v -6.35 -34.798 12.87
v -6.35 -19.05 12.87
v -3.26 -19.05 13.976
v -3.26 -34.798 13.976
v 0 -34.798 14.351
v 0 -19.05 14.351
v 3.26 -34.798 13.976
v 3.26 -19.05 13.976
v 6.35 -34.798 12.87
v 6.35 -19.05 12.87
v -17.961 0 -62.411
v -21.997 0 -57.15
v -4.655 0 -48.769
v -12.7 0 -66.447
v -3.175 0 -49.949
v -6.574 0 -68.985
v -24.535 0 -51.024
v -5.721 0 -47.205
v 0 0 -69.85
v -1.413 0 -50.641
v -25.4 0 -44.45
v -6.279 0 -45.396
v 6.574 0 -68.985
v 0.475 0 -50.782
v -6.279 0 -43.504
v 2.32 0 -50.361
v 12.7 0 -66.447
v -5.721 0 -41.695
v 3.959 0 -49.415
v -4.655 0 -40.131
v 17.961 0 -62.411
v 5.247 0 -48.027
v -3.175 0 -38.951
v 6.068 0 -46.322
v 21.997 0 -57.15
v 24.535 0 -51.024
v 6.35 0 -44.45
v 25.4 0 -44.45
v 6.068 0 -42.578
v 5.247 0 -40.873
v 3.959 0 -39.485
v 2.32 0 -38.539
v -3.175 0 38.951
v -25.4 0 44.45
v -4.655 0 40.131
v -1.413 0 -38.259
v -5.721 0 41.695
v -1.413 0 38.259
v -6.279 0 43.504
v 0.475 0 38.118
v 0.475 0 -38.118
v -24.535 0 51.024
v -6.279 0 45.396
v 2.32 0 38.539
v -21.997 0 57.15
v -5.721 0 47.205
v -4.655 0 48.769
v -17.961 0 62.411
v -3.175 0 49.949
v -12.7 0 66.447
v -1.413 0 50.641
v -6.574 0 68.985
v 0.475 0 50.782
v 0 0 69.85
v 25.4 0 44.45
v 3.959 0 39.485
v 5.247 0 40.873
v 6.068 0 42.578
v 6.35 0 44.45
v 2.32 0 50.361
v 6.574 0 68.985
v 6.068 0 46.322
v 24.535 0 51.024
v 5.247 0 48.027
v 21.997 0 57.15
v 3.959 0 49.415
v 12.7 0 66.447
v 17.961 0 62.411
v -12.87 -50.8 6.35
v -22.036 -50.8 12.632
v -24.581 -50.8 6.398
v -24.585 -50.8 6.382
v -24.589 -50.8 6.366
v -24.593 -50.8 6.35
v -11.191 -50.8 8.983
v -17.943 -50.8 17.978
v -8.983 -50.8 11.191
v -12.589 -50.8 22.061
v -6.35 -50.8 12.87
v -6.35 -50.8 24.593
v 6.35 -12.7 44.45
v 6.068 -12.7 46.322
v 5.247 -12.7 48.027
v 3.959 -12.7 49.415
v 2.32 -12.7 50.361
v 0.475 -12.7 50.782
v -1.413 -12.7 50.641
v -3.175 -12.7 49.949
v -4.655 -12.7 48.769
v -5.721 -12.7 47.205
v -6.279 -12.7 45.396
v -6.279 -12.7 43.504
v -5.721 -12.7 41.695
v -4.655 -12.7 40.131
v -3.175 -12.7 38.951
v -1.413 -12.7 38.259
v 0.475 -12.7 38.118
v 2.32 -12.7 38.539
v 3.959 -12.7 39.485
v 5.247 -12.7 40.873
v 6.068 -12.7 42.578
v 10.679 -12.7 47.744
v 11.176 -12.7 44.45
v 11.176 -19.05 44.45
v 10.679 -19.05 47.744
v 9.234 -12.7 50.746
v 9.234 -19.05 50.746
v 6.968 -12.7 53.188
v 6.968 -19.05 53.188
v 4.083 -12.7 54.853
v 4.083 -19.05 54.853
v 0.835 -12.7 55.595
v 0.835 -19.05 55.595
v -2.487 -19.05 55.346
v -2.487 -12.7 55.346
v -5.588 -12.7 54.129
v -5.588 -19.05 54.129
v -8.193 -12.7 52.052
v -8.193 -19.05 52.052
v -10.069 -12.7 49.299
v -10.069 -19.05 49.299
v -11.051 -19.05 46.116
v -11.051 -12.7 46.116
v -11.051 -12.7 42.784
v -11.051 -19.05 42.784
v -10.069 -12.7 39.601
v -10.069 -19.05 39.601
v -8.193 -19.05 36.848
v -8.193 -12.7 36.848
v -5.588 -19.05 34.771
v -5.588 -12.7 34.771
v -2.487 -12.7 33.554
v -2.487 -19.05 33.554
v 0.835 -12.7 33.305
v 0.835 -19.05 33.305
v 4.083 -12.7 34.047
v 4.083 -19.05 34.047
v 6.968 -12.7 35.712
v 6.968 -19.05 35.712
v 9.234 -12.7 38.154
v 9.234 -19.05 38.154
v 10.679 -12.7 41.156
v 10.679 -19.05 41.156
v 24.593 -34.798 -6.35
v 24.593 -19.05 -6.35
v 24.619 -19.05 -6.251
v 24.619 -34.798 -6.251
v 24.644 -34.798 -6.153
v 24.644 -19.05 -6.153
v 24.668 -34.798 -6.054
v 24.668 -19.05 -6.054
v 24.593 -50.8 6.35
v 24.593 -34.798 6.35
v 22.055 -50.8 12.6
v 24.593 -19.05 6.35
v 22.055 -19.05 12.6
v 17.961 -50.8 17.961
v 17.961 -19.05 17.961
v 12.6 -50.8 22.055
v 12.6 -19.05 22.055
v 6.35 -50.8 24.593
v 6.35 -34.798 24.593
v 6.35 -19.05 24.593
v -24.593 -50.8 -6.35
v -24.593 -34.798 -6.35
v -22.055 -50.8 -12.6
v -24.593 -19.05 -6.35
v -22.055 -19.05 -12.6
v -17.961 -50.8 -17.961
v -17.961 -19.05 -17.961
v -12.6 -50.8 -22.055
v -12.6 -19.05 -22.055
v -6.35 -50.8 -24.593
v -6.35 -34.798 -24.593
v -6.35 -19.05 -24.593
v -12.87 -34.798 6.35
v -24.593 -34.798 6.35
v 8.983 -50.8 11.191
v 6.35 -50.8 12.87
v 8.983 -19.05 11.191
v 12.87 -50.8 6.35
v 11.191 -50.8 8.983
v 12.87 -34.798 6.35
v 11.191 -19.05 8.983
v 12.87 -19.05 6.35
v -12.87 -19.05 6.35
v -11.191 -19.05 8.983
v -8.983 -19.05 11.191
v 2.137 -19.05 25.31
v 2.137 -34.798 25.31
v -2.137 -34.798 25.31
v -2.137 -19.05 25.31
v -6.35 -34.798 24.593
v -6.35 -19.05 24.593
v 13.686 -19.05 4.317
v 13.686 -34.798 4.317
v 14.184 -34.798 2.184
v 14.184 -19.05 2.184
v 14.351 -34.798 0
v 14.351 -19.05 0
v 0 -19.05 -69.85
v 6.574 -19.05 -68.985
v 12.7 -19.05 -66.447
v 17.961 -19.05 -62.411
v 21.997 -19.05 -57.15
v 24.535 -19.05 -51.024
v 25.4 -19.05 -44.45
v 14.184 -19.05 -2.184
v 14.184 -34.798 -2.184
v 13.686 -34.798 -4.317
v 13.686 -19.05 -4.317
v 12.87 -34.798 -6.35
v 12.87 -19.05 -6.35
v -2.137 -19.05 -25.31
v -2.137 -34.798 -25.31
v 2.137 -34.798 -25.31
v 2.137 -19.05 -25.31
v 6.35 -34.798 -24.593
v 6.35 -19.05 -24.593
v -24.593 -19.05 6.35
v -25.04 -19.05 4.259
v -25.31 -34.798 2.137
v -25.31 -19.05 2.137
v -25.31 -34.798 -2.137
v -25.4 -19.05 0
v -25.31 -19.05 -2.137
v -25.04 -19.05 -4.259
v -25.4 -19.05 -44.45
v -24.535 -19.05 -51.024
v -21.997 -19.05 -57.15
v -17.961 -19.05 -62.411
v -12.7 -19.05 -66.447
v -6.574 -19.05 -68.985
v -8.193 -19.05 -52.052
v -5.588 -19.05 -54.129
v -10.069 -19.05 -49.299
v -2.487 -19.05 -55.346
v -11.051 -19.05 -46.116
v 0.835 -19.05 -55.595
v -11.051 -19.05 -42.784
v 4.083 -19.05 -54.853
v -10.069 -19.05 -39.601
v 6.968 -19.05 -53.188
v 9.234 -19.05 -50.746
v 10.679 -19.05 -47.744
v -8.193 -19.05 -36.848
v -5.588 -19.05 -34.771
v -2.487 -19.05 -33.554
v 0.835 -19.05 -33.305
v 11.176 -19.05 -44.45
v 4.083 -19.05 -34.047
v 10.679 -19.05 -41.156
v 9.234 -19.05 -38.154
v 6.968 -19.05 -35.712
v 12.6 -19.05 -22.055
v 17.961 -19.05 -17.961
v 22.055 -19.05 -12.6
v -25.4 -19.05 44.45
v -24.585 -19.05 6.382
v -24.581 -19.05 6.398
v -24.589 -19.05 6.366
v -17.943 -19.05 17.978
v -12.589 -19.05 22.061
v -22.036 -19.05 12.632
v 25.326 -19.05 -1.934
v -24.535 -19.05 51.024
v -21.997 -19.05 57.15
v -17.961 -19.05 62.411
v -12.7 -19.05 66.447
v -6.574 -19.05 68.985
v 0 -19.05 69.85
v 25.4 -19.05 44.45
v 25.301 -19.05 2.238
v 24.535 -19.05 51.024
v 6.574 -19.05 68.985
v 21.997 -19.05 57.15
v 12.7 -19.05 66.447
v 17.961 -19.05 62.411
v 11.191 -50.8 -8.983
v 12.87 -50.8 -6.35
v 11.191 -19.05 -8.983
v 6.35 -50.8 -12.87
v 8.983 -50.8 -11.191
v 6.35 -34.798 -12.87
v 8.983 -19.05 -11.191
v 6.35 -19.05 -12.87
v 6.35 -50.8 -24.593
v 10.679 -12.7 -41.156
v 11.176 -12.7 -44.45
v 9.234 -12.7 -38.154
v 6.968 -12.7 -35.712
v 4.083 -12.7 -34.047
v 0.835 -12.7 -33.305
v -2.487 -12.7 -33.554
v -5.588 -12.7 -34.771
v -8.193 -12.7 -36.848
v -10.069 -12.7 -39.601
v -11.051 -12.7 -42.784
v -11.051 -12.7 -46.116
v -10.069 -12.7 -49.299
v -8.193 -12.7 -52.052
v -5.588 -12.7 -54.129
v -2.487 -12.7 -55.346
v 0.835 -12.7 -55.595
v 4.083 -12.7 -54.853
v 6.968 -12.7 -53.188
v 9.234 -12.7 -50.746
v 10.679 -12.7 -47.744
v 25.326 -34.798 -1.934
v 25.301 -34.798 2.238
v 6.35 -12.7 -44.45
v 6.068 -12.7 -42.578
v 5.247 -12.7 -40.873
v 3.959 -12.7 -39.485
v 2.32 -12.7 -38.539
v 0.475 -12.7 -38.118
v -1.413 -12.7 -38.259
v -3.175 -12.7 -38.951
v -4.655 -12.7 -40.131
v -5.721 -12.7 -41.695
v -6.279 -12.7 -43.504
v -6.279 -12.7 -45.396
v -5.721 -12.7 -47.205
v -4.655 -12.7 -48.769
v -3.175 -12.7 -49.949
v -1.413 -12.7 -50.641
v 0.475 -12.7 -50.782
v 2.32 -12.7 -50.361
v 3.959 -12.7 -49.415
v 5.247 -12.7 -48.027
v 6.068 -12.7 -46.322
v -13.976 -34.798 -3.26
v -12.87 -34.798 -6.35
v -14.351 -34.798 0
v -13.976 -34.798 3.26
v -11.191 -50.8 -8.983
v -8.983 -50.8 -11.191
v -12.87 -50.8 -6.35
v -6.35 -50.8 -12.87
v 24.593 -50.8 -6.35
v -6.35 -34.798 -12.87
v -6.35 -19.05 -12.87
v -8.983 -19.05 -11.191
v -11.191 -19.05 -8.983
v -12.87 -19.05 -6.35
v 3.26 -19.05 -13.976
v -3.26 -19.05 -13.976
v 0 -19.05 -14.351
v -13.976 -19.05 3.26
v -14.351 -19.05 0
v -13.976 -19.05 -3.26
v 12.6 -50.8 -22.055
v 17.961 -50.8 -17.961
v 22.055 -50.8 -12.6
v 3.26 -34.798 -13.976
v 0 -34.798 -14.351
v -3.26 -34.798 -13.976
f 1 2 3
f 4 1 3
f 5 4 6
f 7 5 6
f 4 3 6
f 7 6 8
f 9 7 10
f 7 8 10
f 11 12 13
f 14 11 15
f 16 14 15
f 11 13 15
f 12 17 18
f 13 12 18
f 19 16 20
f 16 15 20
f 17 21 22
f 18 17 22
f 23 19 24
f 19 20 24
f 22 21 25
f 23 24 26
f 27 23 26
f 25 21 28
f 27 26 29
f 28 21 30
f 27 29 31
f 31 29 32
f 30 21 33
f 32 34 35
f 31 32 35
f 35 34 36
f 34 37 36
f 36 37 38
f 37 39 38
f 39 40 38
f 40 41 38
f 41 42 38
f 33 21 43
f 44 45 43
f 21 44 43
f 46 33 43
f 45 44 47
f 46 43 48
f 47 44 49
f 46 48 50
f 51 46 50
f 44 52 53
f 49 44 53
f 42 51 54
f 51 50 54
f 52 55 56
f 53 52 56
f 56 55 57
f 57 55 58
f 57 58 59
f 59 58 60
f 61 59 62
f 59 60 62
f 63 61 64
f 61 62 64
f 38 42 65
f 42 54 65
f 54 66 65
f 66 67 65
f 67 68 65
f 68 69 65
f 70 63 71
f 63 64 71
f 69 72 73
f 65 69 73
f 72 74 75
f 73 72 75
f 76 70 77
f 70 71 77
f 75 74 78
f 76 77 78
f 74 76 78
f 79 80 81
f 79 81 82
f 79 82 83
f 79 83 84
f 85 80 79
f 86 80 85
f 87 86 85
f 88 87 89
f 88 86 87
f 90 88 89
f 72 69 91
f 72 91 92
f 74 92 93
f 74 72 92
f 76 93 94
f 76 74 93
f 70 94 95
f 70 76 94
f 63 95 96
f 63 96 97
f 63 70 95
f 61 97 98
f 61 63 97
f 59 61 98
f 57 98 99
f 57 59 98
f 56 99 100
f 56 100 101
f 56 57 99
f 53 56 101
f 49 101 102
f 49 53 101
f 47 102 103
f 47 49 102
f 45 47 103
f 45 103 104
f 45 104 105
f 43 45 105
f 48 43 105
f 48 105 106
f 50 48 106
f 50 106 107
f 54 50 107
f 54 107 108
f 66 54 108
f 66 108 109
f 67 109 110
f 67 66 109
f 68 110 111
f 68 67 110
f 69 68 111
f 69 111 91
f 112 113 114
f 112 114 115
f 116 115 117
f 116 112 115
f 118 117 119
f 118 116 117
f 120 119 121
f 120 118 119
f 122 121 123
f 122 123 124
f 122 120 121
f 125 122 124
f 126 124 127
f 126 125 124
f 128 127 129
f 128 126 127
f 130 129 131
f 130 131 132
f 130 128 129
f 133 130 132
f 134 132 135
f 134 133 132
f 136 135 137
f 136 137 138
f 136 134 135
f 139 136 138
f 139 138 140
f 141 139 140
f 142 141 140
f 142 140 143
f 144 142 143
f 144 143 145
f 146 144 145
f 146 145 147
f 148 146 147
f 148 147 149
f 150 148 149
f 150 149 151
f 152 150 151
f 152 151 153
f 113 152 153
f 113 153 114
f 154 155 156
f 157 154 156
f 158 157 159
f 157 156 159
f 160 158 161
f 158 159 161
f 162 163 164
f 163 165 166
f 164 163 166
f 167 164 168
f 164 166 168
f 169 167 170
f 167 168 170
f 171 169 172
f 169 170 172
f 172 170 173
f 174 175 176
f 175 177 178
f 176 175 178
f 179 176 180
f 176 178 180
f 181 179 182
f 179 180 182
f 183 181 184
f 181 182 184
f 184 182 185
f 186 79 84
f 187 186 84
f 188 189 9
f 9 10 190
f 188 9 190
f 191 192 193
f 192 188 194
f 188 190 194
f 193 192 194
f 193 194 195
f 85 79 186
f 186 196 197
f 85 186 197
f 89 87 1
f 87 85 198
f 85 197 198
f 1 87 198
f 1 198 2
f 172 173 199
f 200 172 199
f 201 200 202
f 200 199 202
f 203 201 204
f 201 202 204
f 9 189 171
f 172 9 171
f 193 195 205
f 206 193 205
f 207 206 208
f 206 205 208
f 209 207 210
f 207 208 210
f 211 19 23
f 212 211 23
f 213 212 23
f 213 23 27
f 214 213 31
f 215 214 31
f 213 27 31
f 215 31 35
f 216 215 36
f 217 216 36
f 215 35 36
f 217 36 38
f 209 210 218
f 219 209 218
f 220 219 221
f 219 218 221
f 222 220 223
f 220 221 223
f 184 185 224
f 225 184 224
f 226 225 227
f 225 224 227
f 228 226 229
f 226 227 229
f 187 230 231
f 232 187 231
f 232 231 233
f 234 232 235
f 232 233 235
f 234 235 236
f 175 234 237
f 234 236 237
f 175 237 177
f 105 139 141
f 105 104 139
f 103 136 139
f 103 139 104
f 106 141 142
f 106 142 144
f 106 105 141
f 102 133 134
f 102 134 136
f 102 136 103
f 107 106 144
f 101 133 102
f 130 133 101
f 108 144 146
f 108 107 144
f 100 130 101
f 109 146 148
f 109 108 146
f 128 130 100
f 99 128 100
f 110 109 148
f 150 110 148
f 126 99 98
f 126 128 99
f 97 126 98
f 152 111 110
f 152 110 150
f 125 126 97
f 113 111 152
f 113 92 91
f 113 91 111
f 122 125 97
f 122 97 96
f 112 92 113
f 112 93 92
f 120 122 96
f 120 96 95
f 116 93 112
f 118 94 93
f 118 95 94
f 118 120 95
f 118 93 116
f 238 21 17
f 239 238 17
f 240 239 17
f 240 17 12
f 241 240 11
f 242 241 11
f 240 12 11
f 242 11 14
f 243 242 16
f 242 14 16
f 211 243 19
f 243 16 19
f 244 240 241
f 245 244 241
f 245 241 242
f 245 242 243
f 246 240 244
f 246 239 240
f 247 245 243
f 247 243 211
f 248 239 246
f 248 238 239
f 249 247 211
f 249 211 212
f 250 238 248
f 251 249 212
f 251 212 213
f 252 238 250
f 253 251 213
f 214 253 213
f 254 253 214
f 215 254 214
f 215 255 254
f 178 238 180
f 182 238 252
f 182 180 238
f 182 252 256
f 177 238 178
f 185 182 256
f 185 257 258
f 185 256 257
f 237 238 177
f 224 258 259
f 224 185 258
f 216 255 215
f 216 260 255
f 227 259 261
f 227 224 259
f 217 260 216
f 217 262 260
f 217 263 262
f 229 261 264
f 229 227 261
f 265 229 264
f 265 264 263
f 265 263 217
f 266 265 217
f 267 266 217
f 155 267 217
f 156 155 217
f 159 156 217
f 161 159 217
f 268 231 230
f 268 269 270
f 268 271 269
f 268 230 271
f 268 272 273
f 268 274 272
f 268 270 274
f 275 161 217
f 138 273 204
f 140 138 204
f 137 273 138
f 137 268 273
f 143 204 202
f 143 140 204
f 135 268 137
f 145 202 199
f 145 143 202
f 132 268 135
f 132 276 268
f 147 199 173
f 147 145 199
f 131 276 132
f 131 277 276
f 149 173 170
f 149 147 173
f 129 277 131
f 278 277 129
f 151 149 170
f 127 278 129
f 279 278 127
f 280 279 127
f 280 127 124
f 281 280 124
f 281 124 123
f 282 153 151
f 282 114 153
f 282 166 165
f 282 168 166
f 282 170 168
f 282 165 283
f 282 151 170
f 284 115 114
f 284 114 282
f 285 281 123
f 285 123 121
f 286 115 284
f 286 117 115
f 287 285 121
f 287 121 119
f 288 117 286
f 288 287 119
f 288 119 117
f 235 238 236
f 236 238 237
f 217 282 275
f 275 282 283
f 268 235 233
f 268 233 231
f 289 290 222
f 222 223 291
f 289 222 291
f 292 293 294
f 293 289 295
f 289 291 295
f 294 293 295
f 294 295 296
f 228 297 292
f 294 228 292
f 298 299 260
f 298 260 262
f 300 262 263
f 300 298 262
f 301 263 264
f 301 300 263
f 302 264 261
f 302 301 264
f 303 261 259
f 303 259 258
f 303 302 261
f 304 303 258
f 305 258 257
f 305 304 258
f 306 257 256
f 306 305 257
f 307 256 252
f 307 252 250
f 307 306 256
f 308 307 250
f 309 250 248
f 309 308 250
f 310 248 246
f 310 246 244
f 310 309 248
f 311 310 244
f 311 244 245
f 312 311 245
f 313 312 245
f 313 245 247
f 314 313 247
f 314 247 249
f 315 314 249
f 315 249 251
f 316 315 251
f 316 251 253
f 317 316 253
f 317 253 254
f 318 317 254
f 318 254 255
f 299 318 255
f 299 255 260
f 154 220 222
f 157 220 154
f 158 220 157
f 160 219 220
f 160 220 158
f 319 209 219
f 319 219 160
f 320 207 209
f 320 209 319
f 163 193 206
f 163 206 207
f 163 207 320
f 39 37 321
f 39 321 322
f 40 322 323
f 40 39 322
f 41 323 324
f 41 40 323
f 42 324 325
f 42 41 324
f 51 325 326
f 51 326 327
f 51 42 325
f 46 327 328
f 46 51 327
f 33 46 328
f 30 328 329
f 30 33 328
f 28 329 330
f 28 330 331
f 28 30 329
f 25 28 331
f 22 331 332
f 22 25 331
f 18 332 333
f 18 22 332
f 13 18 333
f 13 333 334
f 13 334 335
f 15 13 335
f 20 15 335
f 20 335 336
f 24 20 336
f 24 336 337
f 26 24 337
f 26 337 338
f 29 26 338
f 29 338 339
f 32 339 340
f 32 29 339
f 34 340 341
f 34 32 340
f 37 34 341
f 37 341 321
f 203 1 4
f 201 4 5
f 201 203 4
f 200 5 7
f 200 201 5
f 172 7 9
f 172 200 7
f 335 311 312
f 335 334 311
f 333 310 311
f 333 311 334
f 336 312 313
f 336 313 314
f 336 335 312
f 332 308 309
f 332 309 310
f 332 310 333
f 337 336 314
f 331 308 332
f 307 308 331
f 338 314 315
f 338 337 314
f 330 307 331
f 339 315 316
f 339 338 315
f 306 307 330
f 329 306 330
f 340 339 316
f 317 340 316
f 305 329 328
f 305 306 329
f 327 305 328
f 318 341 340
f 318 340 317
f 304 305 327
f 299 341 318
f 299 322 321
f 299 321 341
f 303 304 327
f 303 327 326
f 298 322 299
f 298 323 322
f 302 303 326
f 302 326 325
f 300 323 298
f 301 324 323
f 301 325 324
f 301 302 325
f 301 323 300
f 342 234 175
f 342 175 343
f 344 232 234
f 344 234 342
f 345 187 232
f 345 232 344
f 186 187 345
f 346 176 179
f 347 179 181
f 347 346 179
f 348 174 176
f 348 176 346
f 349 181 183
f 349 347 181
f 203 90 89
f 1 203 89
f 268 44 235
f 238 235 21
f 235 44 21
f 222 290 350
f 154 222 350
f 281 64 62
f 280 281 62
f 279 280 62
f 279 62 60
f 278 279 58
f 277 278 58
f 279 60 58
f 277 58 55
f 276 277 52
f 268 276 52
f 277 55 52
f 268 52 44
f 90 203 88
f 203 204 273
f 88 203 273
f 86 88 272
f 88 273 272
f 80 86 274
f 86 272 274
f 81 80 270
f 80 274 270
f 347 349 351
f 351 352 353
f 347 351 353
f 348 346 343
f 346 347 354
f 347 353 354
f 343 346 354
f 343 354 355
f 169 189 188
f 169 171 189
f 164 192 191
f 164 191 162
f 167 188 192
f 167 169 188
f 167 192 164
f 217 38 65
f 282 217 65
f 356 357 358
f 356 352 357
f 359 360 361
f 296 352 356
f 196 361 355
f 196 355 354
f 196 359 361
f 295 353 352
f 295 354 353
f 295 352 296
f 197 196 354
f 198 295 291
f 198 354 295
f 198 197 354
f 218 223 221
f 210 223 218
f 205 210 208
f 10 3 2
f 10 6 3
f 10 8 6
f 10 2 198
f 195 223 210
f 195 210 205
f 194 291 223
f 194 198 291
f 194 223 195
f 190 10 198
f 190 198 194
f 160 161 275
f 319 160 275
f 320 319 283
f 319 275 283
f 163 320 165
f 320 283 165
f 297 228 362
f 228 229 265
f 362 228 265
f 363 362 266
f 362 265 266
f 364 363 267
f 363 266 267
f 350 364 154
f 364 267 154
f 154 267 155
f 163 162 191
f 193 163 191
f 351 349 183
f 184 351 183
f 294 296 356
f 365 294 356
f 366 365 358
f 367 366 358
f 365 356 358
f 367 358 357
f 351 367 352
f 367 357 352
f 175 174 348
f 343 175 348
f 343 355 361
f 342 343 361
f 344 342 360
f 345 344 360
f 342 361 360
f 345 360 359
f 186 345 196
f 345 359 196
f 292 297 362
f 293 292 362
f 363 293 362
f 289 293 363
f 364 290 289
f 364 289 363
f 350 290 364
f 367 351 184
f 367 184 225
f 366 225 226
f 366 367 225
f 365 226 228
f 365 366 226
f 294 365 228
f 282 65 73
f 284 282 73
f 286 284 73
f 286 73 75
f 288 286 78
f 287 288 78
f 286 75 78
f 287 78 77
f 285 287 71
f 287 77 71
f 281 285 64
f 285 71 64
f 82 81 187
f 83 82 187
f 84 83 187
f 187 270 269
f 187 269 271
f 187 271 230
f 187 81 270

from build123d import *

# Parameters (mm, degrees)
F0_R     = 11.176
F1_DEPTH = 19.05
F0_R_2   = 6.35
F2_DEPTH = 12.7
F4_DEPTH = 31.75
F6_DEPTH = 16.002


with BuildPart() as f1:
    # F0 (on Front) → F1 (new body)
    with BuildSketch(Plane.XZ):
        with BuildLine():
            ThreePointArc((-25.4, -44.45), (-17.960512, -62.410512), (0, -69.85))
            ThreePointArc((0, -69.85), (17.960512, -62.410512), (25.4, -44.45))
            Line((25.4, -44.45), (25.4, 44.45))
            ThreePointArc((25.4, 44.45), (17.960512, 62.410512), (0, 69.85))
            ThreePointArc((0, 69.85), (-17.960512, 62.410512), (-25.4, 44.45))
            Line((-25.4, 44.45), (-25.4, -44.45))
        make_face()
        with Locations((0, -44.45)):
            Circle(F0_R, mode=Mode.SUBTRACT)
        with Locations((0, 44.45)):
            Circle(F0_R, mode=Mode.SUBTRACT)
    extrude(amount=F1_DEPTH)

    # F0 (on Front) → F2 (join)
    with BuildSketch(Plane.XZ):
        with Locations((0, -44.45)):
            Circle(F0_R)
        with Locations((0, -44.45)):
            Circle(F0_R_2, mode=Mode.SUBTRACT)
        with Locations((0, 44.45)):
            Circle(F0_R)
        with Locations((0, 44.45)):
            Circle(F0_R_2, mode=Mode.SUBTRACT)
    extrude(amount=F2_DEPTH)

    # F3 (on face) → F4 (join)
    with BuildSketch(Plane.XZ.offset(19.05)):
        with BuildLine():
            ThreePointArc((12.869681, 6.35), (13.975765, 3.260246), (14.351, 0))
            ThreePointArc((14.351, 0), (13.975765, -3.260246), (12.869681, -6.35))
            Line((12.869681, -6.35), (24.593444, -6.35))
            ThreePointArc((24.593444, -6.35), (24.631158, -6.2021), (24.667983, -6.053976))
            ThreePointArc((24.667983, -6.053976), (25.399541, 0.152632), (24.593444, 6.35))
            Line((24.593444, 6.35), (12.869681, 6.35))
        make_face()
        with BuildLine():
            ThreePointArc((6.35, 12.869681), (10.147689, 10.147689), (12.869681, 6.35))
            Line((12.869681, 6.35), (24.593444, 6.35))
            ThreePointArc((24.593444, 6.35), (17.960512, 17.960512), (6.35, 24.593444))
            Line((6.35, 24.593444), (6.35, 12.869681))
        make_face()
        with BuildLine():
            Line((24.593444, -6.35), (12.869681, -6.35))
            ThreePointArc((12.869681, -6.35), (10.147689, -10.147689), (6.35, -12.869681))
            Line((6.35, -12.869681), (6.35, -24.593444))
            ThreePointArc((6.35, -24.593444), (17.960512, -17.960512), (24.593444, -6.35))
        make_face()
        with BuildLine():
            ThreePointArc((-6.35, 12.869681), (0, 14.351), (6.35, 12.869681))
            Line((6.35, 12.869681), (6.35, 24.593444))
            ThreePointArc((6.35, 24.593444), (0, 25.4), (-6.35, 24.593444))
            Line((-6.35, 24.593444), (-6.35, 12.869681))
        make_face()
        with BuildLine():
            Line((6.35, -24.593444), (6.35, -12.869681))
            ThreePointArc((6.35, -12.869681), (0, -14.351), (-6.35, -12.869681))
            Line((-6.35, -12.869681), (-6.35, -24.593444))
            ThreePointArc((-6.35, -24.593444), (0, -25.4), (6.35, -24.593444))
        make_face()
        with BuildLine():
            ThreePointArc((-12.869681, 6.35), (-10.147689, 10.147689), (-6.35, 12.869681))
            Line((-6.35, 12.869681), (-6.35, 24.593444))
            ThreePointArc((-6.35, 24.593444), (-17.943038, 17.977969), (-24.581048, 6.397819))
            ThreePointArc((-24.581048, 6.397819), (-24.587258, 6.373913), (-24.593444, 6.35))
            Line((-24.593444, 6.35), (-12.869681, 6.35))
        make_face()
        with BuildLine():
            Line((-6.35, -24.593444), (-6.35, -12.869681))
            ThreePointArc((-6.35, -12.869681), (-10.147689, -10.147689), (-12.869681, -6.35))
            Line((-12.869681, -6.35), (-24.593444, -6.35))
            ThreePointArc((-24.593444, -6.35), (-17.960512, -17.960512), (-6.35, -24.593444))
        make_face()
        with BuildLine():
            ThreePointArc((-12.869681, -6.35), (-14.351, 0), (-12.869681, 6.35))
            Line((-12.869681, 6.35), (-24.593444, 6.35))
            ThreePointArc((-24.593444, 6.35), (-25.4, 0), (-24.593444, -6.35))
            Line((-24.593444, -6.35), (-12.869681, -6.35))
        make_face()
    extrude(amount=F4_DEPTH)

    # F5 (on face) → F6 (cut)
    with BuildSketch(Plane.XZ.offset(50.8)):
        with BuildLine():
            ThreePointArc((24.667983, -6.053976), (25.399541, 0.152632), (24.593444, 6.35))
            Line((24.593444, 6.35), (12.869681, 6.35))
            ThreePointArc((12.869681, 6.35), (13.975765, 3.260246), (14.351, 0))
            ThreePointArc((14.351, 0), (13.975765, -3.260246), (12.869681, -6.35))
            Line((12.869681, -6.35), (24.593444, -6.35))
            ThreePointArc((24.593444, -6.35), (24.631158, -6.2021), (24.667983, -6.053976))
        make_face()
        with BuildLine():
            ThreePointArc((-12.869681, -6.35), (-14.351, 0), (-12.869681, 6.35))
            Line((-12.869681, 6.35), (-24.593444, 6.35))
            ThreePointArc((-24.593444, 6.35), (-25.4, 0), (-24.593444, -6.35))
            Line((-24.593444, -6.35), (-12.869681, -6.35))
        make_face()
        with BuildLine():
            ThreePointArc((6.35, -12.869681), (0, -14.351), (-6.35, -12.869681))
            Line((-6.35, -12.869681), (-6.35, -24.593444))
            ThreePointArc((-6.35, -24.593444), (0, -25.4), (6.35, -24.593444))
            Line((6.35, -24.593444), (6.35, -12.869681))
        make_face()
        with BuildLine():
            ThreePointArc((6.35, 24.593444), (0, 25.4), (-6.35, 24.593444))
            Line((-6.35, 24.593444), (-6.35, 12.869681))
            ThreePointArc((-6.35, 12.869681), (0, 14.351), (6.35, 12.869681))
            Line((6.35, 12.869681), (6.35, 24.593444))
        make_face()
    extrude(amount=-F6_DEPTH, mode=Mode.SUBTRACT)


solid = f1.part
